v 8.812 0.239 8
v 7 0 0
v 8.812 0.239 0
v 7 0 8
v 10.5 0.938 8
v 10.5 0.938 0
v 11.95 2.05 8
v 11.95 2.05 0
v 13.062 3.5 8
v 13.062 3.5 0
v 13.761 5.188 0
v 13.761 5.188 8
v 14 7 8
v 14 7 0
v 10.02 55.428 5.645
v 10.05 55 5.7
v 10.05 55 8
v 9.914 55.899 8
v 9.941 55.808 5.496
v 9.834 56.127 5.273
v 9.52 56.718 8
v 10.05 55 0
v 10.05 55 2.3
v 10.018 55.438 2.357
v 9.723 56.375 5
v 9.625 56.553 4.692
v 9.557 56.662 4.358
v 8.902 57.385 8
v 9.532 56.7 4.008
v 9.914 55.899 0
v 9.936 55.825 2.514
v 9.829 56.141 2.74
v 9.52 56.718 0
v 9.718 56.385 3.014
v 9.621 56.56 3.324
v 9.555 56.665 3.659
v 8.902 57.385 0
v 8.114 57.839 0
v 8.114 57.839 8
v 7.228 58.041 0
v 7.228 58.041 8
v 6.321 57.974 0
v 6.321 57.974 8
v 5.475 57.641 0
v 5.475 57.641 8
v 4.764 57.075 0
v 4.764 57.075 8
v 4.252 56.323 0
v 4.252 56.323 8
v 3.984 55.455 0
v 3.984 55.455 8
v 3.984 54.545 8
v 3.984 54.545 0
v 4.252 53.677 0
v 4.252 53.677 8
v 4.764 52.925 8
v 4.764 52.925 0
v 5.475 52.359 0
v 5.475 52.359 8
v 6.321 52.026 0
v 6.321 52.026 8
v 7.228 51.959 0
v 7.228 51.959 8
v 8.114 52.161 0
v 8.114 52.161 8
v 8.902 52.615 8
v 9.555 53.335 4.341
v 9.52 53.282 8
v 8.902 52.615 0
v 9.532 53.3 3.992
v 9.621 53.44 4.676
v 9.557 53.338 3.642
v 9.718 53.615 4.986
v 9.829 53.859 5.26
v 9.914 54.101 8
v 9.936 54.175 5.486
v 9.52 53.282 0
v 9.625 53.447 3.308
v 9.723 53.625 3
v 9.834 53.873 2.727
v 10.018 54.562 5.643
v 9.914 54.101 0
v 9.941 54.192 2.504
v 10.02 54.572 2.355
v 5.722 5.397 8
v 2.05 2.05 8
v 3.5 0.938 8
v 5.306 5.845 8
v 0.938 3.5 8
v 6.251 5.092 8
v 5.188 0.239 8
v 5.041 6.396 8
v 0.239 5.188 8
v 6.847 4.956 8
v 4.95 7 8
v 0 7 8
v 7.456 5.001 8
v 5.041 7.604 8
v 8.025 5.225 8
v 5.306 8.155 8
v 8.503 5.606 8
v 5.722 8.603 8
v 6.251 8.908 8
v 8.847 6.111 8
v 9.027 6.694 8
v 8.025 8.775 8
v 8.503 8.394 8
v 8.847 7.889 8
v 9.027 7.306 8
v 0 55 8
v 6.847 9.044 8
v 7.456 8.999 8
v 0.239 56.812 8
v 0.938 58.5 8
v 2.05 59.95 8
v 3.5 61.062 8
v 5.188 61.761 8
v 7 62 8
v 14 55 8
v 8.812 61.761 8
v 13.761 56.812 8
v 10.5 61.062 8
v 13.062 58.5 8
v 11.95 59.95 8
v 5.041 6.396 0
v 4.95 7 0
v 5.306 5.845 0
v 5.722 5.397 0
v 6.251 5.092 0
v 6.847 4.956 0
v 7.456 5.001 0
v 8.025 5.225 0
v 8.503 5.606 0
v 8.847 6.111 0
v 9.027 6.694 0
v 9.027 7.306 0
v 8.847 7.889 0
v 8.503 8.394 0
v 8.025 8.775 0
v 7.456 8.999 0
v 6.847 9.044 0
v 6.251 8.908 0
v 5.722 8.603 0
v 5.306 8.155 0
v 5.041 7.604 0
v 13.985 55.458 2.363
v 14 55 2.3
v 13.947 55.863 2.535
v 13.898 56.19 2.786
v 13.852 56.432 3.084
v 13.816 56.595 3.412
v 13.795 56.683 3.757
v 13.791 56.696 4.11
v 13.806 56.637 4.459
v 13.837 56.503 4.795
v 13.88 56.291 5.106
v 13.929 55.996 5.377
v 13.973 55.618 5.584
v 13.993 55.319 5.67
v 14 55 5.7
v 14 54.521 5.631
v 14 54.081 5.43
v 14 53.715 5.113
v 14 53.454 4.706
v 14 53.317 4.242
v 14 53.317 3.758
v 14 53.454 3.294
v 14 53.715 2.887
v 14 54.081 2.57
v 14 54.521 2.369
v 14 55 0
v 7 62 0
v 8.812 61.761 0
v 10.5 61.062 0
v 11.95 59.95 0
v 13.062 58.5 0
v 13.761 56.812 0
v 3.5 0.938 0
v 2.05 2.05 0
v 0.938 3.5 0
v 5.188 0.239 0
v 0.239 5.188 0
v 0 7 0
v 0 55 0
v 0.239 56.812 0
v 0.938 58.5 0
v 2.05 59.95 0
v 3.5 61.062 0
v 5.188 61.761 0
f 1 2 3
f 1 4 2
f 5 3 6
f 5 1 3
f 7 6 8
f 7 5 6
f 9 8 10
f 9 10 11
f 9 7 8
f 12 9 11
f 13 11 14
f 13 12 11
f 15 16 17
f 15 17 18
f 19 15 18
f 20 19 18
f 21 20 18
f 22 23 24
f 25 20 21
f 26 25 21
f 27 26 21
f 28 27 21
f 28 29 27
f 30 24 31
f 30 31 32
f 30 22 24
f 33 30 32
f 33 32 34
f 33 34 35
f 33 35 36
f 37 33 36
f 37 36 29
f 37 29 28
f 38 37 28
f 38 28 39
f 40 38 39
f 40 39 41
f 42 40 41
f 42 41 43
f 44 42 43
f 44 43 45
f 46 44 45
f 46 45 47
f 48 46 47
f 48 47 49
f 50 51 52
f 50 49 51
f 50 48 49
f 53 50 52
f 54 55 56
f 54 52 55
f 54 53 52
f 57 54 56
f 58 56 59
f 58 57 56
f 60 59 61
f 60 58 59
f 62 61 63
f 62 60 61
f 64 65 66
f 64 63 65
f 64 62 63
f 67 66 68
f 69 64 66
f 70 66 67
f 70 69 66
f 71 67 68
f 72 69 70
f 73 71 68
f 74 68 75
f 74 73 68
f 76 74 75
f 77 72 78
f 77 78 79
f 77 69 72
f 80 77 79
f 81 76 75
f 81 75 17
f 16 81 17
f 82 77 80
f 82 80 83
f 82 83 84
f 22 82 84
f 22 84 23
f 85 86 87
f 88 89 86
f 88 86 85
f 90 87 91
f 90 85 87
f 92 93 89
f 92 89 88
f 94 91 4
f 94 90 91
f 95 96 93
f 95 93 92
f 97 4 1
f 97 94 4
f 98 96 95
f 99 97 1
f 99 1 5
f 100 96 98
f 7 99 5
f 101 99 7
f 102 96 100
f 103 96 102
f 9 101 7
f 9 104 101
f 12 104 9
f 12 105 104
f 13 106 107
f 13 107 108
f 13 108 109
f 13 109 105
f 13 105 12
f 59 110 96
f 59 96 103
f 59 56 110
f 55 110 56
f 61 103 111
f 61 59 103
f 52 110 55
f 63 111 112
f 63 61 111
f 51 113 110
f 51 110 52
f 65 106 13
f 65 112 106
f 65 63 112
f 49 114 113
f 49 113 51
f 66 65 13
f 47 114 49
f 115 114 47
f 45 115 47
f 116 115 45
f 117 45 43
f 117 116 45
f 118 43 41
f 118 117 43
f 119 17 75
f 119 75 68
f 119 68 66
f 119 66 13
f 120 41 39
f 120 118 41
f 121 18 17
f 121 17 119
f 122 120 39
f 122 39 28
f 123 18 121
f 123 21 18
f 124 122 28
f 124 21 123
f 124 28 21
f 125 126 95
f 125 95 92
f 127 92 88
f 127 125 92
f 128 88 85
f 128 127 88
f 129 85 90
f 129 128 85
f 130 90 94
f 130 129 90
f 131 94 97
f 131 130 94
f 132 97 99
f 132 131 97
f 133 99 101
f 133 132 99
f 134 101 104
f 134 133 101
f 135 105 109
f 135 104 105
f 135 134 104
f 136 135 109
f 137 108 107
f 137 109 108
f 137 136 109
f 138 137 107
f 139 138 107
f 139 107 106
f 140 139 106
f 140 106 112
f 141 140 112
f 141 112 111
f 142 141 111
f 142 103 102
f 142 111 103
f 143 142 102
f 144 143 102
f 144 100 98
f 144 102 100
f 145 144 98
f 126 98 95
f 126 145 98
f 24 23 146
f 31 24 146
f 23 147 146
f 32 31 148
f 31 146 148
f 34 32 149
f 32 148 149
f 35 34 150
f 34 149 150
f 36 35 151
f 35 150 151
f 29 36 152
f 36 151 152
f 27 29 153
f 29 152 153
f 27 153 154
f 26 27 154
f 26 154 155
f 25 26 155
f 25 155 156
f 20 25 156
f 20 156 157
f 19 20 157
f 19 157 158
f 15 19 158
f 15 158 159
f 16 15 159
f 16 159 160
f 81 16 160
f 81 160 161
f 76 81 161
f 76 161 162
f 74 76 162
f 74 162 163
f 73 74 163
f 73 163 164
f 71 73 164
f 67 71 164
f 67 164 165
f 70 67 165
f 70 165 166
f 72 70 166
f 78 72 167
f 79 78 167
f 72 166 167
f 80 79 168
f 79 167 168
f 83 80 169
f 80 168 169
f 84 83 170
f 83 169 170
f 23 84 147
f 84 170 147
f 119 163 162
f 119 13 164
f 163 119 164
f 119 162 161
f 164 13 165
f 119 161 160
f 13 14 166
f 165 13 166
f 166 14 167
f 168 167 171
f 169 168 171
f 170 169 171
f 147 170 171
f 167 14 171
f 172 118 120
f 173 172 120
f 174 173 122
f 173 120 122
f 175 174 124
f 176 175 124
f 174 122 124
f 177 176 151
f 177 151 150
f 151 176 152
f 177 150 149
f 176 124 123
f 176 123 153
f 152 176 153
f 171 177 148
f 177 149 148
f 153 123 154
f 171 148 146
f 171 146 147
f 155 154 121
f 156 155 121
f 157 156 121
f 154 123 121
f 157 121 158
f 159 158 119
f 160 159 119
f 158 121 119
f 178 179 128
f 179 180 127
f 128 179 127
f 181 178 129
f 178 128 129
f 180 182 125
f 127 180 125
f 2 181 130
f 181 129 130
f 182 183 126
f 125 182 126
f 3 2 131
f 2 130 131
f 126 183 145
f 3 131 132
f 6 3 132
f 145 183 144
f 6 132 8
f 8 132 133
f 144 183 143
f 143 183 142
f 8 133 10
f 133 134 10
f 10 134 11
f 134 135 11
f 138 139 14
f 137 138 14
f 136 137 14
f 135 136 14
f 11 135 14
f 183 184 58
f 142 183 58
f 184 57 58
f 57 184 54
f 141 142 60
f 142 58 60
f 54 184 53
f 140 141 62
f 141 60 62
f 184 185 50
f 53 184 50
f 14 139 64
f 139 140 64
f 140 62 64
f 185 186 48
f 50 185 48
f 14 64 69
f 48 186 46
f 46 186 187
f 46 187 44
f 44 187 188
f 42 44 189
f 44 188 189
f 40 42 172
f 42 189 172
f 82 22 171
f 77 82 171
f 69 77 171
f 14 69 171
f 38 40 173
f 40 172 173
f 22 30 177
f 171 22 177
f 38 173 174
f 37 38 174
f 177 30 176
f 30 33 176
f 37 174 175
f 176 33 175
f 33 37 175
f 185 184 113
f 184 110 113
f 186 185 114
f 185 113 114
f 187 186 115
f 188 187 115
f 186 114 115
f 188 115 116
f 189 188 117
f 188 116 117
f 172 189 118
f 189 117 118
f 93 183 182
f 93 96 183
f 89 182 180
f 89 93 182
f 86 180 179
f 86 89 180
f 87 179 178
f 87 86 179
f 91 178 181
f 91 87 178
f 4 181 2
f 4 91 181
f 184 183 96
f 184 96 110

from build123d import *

# Parameters (mm, degrees)
ESQUISSE2_W                  = 14
ESQUISSE2_H                  = 62
BOSS_EXTRU_1_DEPTH           = 8
ENL_V_MAT_EXTRU_1_DEPTH      = 65.062469512
ENL_V_MAT_EXTRU_1_DEPTH_BACK = 65.062469512
ESQUISSE3_R                  = 3.05
ESQUISSE3_R_2                = 2.05
CONG_1_R                     = 7
ENL_V_MAT_EXTRU_2_REACH      = 66.062
ENL_V_MAT_EXTRU_2_END_RADIUS = 3.05
ESQUISSE4_R                  = 1.7


with BuildPart() as part:
    # Esquisse2 → Boss.-Extru.1 (new body)
    with BuildSketch(Plane.XY):
        with Locations((7, 31)):
            Rectangle(ESQUISSE2_W, ESQUISSE2_H)
    extrude(amount=BOSS_EXTRU_1_DEPTH)

    # Esquisse3 → Enlèv. mat.-Extru.1 (cut, two sides: drawn at the far end of the back side and taken through both)
    with BuildSketch(Plane.XY.offset(8).offset(-ENL_V_MAT_EXTRU_1_DEPTH_BACK)):
        with Locations((7, 55)):
            Circle(ESQUISSE3_R)
        with Locations(Location((7, 7, 0), (0, 0, 180))):
            Circle(ESQUISSE3_R_2)
    extrude(amount=ENL_V_MAT_EXTRU_1_DEPTH + ENL_V_MAT_EXTRU_1_DEPTH_BACK, mode=Mode.SUBTRACT)

    # Congé1
    cong_1_edges = [part.edges().sort_by_distance(p)[0] for p in [
        (14, 0, 4),
        (0, 0, 4),
        (0, 62, 4),
        (14, 62, 4),
    ]]
    fillet(cong_1_edges, radius=CONG_1_R - 0.0001)  # a hair under: the kernel refuses the full size

    # Enlèv. mat.-Extru.2: up to this cylinder (the profile starts outside it)
    enl_v_mat_extru_2_end = Plane(origin=(7, 55, 4), z_dir=(0, 0, 1)) * Cylinder(ENL_V_MAT_EXTRU_2_END_RADIUS, 139.224, mode=Mode.PRIVATE)
    # Esquisse4 → Enlèv. mat.-Extru.2 (cut, up to the surface)
    with BuildSketch(Plane(origin=(14, 0, 0), x_dir=(0, 0, -1), z_dir=(1, 0, 0)), mode=Mode.PRIVATE) as enl_v_mat_extru_2_sk1:
        with Locations((-4, 55)):
            Circle(ESQUISSE4_R)
    enl_v_mat_extru_2_tool1 = extrude(enl_v_mat_extru_2_sk1.sketch, amount=-ENL_V_MAT_EXTRU_2_REACH, mode=Mode.PRIVATE) - enl_v_mat_extru_2_end
    add(enl_v_mat_extru_2_tool1.solids().sort_by_distance((14, 55, 4))[0], mode=Mode.SUBTRACT)


solid = part.part
